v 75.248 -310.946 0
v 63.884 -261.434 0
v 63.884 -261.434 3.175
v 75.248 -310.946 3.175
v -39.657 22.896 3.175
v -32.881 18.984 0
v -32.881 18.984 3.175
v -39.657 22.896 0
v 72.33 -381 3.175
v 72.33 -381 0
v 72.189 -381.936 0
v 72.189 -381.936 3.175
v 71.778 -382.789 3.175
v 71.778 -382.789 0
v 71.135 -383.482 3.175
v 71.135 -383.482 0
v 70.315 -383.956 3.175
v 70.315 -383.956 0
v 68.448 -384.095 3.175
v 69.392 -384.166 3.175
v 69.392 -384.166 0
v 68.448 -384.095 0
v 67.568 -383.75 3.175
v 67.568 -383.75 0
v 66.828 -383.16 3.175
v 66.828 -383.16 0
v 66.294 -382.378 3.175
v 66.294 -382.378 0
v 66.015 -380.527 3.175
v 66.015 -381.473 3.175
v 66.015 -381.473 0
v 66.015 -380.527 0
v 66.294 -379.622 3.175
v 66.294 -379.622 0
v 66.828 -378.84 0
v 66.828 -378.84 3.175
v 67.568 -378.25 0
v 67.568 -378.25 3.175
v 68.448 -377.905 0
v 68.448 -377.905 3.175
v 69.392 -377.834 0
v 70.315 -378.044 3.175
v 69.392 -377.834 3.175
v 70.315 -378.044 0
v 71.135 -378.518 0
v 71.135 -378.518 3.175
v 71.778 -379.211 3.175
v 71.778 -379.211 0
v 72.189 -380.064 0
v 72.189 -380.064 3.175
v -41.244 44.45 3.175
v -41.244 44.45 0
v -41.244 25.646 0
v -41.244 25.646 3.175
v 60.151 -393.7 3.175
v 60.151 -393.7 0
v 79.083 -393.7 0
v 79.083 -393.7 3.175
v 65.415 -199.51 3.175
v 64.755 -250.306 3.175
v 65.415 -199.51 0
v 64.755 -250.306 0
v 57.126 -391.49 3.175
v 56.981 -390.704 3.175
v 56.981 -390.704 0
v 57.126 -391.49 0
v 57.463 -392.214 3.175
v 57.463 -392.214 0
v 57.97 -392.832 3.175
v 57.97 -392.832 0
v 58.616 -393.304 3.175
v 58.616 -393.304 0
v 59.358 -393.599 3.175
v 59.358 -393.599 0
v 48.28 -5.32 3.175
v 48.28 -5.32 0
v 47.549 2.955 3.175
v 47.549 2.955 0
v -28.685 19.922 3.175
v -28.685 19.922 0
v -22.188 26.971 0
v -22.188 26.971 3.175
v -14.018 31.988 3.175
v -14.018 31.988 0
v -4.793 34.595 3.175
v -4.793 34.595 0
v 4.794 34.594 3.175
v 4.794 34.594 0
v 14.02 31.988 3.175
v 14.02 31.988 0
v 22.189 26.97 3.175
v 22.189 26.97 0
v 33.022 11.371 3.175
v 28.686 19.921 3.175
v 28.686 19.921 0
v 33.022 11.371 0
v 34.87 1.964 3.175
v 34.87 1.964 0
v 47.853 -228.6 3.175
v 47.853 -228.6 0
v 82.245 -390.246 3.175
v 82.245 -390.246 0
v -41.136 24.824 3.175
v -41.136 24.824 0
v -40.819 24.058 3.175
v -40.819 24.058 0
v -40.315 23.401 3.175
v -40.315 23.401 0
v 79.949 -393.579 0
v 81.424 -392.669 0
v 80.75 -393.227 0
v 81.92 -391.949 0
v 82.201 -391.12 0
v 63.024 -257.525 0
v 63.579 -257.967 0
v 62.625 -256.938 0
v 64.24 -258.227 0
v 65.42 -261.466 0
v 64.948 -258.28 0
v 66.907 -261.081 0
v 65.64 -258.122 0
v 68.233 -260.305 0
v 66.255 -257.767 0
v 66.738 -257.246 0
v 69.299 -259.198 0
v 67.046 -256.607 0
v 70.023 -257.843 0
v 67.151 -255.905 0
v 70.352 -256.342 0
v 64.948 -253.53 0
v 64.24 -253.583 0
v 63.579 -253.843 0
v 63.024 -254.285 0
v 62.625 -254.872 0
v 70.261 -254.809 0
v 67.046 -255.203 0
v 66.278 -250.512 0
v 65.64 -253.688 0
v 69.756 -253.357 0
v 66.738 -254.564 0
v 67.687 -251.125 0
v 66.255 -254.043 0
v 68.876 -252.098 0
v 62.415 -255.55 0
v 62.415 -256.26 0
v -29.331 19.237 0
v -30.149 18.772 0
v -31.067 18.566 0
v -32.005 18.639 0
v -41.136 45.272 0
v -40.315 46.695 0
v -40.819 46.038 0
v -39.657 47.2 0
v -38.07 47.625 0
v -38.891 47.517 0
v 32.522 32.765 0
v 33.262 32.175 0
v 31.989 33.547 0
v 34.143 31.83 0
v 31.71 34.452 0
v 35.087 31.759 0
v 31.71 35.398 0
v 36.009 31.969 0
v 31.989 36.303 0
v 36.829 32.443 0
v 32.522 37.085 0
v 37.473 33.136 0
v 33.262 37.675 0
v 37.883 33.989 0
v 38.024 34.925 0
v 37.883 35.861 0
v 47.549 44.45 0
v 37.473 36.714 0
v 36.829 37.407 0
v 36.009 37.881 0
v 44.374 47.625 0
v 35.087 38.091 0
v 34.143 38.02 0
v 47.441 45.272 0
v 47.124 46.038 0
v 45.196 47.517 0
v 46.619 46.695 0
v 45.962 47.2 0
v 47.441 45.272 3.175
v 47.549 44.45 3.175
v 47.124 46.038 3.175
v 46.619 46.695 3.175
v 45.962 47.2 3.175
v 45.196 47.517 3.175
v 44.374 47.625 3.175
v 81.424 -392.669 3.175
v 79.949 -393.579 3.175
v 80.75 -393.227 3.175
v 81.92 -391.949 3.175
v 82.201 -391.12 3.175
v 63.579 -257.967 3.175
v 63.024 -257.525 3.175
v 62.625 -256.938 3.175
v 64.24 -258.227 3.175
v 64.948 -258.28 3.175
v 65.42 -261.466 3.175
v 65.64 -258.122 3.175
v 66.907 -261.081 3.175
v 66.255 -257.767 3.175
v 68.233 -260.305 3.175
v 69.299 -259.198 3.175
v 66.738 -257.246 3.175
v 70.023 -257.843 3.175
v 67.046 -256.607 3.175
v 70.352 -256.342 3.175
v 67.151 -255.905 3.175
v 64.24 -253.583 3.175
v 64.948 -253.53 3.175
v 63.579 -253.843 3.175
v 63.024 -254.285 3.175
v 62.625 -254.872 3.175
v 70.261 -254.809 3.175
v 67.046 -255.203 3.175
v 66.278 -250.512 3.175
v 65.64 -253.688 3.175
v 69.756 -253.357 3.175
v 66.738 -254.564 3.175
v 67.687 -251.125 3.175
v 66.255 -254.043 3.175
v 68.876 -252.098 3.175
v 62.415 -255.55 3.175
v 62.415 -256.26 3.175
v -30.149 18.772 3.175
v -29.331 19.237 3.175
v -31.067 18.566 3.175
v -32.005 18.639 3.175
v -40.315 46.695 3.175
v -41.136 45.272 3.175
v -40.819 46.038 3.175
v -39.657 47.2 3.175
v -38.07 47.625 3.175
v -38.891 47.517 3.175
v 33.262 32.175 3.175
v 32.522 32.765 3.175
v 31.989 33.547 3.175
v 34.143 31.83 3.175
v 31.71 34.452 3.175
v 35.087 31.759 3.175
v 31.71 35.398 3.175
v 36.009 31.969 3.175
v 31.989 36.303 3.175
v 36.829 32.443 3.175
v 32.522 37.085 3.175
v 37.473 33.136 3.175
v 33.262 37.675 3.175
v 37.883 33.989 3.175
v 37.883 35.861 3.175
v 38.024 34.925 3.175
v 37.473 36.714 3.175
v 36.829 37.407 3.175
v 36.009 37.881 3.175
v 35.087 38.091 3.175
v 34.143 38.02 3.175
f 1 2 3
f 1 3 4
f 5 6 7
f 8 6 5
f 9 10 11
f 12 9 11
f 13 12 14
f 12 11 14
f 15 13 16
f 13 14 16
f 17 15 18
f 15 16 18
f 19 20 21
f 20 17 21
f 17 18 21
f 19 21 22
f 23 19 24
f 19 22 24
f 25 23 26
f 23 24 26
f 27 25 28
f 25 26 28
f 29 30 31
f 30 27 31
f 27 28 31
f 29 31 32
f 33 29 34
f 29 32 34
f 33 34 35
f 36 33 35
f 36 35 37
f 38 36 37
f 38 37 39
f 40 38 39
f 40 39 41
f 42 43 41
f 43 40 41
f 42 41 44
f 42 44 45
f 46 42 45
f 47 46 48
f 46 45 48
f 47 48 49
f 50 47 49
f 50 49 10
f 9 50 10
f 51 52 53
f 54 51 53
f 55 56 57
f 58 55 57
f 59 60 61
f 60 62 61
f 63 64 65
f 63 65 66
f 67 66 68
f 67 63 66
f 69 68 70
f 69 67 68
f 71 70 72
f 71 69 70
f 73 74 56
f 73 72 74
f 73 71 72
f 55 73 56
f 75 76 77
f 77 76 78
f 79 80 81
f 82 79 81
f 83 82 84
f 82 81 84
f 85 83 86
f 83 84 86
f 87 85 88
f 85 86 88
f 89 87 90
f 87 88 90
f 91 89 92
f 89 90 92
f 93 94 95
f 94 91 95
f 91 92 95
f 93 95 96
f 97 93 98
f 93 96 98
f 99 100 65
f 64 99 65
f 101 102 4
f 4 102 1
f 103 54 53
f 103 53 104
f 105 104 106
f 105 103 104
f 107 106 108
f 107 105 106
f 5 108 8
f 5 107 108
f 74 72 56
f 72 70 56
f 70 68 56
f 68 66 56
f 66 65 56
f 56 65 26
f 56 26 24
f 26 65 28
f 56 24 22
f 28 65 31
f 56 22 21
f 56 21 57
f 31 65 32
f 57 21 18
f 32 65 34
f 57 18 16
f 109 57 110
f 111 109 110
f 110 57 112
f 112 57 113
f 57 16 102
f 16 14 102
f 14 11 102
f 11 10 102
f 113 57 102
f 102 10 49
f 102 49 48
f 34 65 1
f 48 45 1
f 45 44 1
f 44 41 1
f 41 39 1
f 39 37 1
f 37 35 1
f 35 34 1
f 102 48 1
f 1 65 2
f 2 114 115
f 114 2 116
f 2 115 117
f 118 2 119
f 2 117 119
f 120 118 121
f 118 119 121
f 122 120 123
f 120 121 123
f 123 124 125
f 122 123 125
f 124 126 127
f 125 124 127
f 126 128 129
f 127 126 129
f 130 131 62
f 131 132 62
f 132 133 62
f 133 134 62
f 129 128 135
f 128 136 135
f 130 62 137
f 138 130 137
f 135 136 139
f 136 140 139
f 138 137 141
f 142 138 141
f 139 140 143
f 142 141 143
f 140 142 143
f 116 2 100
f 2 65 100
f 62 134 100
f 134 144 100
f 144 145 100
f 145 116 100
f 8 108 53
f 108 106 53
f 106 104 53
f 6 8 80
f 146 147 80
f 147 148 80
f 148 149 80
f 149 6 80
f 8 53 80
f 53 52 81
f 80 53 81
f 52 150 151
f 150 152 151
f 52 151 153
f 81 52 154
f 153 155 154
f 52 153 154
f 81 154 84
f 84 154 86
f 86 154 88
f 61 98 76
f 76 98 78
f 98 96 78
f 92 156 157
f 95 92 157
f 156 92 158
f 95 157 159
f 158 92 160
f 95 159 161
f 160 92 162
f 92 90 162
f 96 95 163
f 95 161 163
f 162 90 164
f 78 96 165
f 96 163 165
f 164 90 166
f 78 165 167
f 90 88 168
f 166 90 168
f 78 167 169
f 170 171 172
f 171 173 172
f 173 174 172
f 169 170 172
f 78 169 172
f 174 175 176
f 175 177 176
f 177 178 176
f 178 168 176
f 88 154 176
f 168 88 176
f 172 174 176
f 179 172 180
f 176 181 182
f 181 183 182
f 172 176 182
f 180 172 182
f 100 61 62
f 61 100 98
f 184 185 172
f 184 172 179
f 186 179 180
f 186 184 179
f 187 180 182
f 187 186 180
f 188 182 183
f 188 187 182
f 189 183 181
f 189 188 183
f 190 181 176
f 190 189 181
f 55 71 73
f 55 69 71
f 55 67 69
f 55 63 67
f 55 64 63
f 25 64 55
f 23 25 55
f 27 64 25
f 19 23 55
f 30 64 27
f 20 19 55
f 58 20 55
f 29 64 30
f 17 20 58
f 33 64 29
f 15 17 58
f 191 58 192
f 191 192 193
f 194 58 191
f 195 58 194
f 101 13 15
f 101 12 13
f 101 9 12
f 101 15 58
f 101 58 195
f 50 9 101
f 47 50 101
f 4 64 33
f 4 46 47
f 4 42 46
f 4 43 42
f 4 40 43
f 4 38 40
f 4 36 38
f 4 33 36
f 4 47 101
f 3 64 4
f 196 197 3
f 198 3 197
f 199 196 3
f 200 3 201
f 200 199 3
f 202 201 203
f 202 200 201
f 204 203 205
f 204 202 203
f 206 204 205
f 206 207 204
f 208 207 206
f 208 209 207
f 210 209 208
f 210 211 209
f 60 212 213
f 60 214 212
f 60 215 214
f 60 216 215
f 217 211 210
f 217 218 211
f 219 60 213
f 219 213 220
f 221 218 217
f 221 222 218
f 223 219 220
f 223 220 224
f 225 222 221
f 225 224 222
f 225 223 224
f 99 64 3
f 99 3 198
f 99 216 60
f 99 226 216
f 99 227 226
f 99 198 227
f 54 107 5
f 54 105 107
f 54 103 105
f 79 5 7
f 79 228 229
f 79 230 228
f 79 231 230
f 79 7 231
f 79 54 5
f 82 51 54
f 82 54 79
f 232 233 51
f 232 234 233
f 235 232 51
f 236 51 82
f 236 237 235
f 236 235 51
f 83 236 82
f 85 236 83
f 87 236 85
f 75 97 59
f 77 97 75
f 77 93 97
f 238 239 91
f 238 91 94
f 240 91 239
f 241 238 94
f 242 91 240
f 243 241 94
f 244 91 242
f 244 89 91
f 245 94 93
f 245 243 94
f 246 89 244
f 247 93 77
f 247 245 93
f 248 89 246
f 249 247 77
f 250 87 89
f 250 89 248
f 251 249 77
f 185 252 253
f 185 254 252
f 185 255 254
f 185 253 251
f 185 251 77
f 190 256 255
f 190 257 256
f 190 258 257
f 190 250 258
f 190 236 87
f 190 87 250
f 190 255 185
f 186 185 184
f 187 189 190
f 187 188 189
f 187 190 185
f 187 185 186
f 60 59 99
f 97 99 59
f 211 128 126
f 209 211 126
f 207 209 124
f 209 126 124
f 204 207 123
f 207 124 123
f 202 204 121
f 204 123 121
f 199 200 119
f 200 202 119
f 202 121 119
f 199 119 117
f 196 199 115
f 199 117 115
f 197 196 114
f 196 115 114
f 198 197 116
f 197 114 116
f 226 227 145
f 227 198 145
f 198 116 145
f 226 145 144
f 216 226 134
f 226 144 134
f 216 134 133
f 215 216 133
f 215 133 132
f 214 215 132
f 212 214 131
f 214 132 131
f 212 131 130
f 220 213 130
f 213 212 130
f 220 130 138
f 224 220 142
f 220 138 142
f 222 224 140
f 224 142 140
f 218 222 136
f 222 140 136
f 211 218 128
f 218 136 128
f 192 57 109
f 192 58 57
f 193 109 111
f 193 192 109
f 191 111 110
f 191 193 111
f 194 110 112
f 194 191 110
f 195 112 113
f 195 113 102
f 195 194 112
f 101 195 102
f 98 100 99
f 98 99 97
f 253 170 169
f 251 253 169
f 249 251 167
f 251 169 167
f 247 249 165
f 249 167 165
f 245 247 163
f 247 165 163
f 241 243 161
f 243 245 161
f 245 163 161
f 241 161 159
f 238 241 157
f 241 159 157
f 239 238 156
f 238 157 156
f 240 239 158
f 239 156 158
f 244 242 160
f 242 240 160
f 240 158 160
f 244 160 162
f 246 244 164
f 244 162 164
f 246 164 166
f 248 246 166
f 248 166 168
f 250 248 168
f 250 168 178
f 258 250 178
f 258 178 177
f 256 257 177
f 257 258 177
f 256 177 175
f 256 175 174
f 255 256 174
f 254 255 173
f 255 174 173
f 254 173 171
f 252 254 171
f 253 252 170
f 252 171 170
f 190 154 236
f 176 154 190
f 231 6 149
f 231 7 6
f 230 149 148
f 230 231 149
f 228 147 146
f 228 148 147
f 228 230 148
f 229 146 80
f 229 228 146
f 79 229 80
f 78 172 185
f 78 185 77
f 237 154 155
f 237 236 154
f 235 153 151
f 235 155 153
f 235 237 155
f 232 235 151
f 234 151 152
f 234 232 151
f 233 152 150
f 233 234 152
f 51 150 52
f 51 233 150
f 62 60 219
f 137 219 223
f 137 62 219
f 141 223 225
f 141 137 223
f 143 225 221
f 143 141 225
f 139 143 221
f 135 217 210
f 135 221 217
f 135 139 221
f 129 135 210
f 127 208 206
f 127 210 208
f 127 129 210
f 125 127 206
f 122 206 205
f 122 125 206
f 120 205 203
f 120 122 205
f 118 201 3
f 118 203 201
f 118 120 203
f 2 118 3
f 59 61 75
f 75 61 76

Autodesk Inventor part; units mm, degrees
ref_plane "YZ Plane" through (0, 0, 0) normal (1, 0, 0) x (0, 1, 0)
ref_plane "XZ Plane" through (0, 0, 0) normal (0, 1, 0) x (-1, 0, 0)
ref_plane "XY Plane" through (0, 0, 0) normal (0, 0, 1) x (1, 0, 0)
sketch "Sketch1" plane through (0, 0, 0) normal (0, 0, 1) x (1, 0, 0)
  line L0 (82.55, -393.7) -> (48.2795, -5.3201)
  line L1 (47.853, -228.6) -> (34.8698, 1.9636)
  line L2 (57.15, -393.7) -> (82.55, -393.7)
  circle A0 centre (69.155, -381) radius 3.175
  line L3 (0, 0) -> (-58.2409, 0) construction
  line L4 (-30.2459, 17.4625) -> (-41.2445, 23.8125)
  line L5 (47.5493, 47.625) -> (47.5493, 2.9548)
  arc A1 (34.8698, 1.9636) -> (-30.2459, 17.4625) centre (0, 0) ccw
  line L6 (-41.2445, 47.625) -> (-41.2445, 23.8125)
  line L7 (-41.2445, 47.625) -> (161.9555, 47.625) construction
  line L8 (-41.2445, 47.625) -> (161.9555, 47.625) construction
  line L9 (-41.2445, 47.625) -> (161.9555, 47.625) construction
  line L10 (-41.2445, 47.625) -> (161.9555, 47.625) construction
  line L11 (-41.2445, 47.625) -> (47.5493, 47.625)
  line L12 (47.853, -228.6) -> (57.15, -393.7)
  circle A2 centre (64.77, -255.905) radius 2.3813
  circle A3 centre (34.8493, 34.925) radius 3.175
  circle A4 centre (64.77, -255.905) radius 5.5993
  line L13 (64.7552, -250.3058) -> (65.4147, -199.51)
  line L14 (63.8836, -261.4336) -> (75.2478, -310.9462)
  line L15 (75.2478, -310.9462) -> (65.4147, -199.51)
  line L16 (48.2795, -5.3201) -> (47.5493, 2.9548)
  point P0 (47.5493, 25.2899)
  point P1 (51.4288, -292.1)
  point P2 (66.5391, -212.2523)
  point P3 (73.9365, -296.0849)
  dimension "d0" = 69.85
  dimension "d1" = 30
  dimension "d2" = 57.15
  dimension "d3" = 25.4
  dimension "d4" = 393.7
  dimension "d5" = 6.35
  dimension "d6" = 12.7
  dimension "d7" = 12.7
  dimension "d8" = 4.7625
  dimension "d9" = 7.62
  dimension "d10" = 137.795
  dimension "d11" = 6.35
  dimension "d12" = 12.7
  dimension "d13" = 12.7
  dimension "d23" = 50.8
  dimension "d24" = 50.8
extrude "Extrusion4" add sketch "Sketch1" along normal blind 3.175 contours L2 L12 L1 A1 L4 L6 L11 L5 L16 L0 L13 A4 L14 | A4
fillet "Fillet1" radius 3.175 6 edges at (-30.2459, 17.4625, 1.5875) (47.5493, 47.625, 1.5875) (-41.2445, 47.625, 1.5875) (82.55, -393.7, 1.5875) (57.15, -393.7, 1.5875) (-41.2445, 23.8125, 1.5875)
sketch "Sketch2" plane through (0, 0, 3.175) normal (0, 0, 1) x (1, 0, 0)
  arc A0 (-41.2445, 25.6456) -> (-39.657, 22.896) centre (-38.0695, 25.6456) ccw projected
  line L0 (-39.657, 22.896) -> (-32.8808, 18.9837) projected
  arc A1 (-32.8808, 18.9837) -> (-28.6855, 19.9223) centre (-31.2933, 21.7334) ccw projected
  arc A2 (34.8698, 1.9636) -> (-28.6855, 19.9223) centre (0, 0) ccw projected
  line L1 (34.8698, 1.9636) -> (56.9813, -390.7035) projected
  arc A3 (56.9813, -390.7035) -> (60.1512, -393.7) centre (60.1512, -390.525) ccw projected
  line L2 (60.1512, -393.7) -> (79.0825, -393.7) projected
  arc A4 (79.0825, -393.7) -> (82.2452, -390.2459) centre (79.0825, -390.525) ccw projected
  line L3 (82.2452, -390.2459) -> (75.2478, -310.9462) projected
  line L4 (75.2478, -310.9462) -> (63.8836, -261.4336) projected
  arc A5 (63.8836, -261.4336) -> (64.7552, -250.3058) centre (64.77, -255.905) ccw projected
  line L5 (64.7552, -250.3058) -> (65.4147, -199.51) projected
  line L6 (65.4147, -199.51) -> (47.5493, 2.9548) projected
  line L7 (47.5493, 2.9548) -> (47.5493, 44.45) projected
  arc A6 (47.5493, 44.45) -> (44.3743, 47.625) centre (44.3743, 44.45) ccw projected
  line L8 (44.3743, 47.625) -> (-38.0695, 47.625) projected
  arc A7 (-38.0695, 47.625) -> (-41.2445, 44.45) centre (-38.0695, 44.45) ccw projected
  line L9 (-41.2445, 44.45) -> (-41.2445, 25.6456) projected
  circle A8 centre (69.155, -381) radius 3.175 projected
  circle A9 centre (34.8493, 34.925) radius 3.175 projected
  circle A10 centre (64.77, -255.905) radius 2.3813 projected
  arc A11 (36.6934, -30.4217) -> (-30.6002, 18.635) centre (-17.0402, -33.4475) ccw
  line L10 (38.8613, -68.9195) -> (6.8988, -20.7299)
  dimension "d30" = 30.332
properties part number "PassiveHooks3"
